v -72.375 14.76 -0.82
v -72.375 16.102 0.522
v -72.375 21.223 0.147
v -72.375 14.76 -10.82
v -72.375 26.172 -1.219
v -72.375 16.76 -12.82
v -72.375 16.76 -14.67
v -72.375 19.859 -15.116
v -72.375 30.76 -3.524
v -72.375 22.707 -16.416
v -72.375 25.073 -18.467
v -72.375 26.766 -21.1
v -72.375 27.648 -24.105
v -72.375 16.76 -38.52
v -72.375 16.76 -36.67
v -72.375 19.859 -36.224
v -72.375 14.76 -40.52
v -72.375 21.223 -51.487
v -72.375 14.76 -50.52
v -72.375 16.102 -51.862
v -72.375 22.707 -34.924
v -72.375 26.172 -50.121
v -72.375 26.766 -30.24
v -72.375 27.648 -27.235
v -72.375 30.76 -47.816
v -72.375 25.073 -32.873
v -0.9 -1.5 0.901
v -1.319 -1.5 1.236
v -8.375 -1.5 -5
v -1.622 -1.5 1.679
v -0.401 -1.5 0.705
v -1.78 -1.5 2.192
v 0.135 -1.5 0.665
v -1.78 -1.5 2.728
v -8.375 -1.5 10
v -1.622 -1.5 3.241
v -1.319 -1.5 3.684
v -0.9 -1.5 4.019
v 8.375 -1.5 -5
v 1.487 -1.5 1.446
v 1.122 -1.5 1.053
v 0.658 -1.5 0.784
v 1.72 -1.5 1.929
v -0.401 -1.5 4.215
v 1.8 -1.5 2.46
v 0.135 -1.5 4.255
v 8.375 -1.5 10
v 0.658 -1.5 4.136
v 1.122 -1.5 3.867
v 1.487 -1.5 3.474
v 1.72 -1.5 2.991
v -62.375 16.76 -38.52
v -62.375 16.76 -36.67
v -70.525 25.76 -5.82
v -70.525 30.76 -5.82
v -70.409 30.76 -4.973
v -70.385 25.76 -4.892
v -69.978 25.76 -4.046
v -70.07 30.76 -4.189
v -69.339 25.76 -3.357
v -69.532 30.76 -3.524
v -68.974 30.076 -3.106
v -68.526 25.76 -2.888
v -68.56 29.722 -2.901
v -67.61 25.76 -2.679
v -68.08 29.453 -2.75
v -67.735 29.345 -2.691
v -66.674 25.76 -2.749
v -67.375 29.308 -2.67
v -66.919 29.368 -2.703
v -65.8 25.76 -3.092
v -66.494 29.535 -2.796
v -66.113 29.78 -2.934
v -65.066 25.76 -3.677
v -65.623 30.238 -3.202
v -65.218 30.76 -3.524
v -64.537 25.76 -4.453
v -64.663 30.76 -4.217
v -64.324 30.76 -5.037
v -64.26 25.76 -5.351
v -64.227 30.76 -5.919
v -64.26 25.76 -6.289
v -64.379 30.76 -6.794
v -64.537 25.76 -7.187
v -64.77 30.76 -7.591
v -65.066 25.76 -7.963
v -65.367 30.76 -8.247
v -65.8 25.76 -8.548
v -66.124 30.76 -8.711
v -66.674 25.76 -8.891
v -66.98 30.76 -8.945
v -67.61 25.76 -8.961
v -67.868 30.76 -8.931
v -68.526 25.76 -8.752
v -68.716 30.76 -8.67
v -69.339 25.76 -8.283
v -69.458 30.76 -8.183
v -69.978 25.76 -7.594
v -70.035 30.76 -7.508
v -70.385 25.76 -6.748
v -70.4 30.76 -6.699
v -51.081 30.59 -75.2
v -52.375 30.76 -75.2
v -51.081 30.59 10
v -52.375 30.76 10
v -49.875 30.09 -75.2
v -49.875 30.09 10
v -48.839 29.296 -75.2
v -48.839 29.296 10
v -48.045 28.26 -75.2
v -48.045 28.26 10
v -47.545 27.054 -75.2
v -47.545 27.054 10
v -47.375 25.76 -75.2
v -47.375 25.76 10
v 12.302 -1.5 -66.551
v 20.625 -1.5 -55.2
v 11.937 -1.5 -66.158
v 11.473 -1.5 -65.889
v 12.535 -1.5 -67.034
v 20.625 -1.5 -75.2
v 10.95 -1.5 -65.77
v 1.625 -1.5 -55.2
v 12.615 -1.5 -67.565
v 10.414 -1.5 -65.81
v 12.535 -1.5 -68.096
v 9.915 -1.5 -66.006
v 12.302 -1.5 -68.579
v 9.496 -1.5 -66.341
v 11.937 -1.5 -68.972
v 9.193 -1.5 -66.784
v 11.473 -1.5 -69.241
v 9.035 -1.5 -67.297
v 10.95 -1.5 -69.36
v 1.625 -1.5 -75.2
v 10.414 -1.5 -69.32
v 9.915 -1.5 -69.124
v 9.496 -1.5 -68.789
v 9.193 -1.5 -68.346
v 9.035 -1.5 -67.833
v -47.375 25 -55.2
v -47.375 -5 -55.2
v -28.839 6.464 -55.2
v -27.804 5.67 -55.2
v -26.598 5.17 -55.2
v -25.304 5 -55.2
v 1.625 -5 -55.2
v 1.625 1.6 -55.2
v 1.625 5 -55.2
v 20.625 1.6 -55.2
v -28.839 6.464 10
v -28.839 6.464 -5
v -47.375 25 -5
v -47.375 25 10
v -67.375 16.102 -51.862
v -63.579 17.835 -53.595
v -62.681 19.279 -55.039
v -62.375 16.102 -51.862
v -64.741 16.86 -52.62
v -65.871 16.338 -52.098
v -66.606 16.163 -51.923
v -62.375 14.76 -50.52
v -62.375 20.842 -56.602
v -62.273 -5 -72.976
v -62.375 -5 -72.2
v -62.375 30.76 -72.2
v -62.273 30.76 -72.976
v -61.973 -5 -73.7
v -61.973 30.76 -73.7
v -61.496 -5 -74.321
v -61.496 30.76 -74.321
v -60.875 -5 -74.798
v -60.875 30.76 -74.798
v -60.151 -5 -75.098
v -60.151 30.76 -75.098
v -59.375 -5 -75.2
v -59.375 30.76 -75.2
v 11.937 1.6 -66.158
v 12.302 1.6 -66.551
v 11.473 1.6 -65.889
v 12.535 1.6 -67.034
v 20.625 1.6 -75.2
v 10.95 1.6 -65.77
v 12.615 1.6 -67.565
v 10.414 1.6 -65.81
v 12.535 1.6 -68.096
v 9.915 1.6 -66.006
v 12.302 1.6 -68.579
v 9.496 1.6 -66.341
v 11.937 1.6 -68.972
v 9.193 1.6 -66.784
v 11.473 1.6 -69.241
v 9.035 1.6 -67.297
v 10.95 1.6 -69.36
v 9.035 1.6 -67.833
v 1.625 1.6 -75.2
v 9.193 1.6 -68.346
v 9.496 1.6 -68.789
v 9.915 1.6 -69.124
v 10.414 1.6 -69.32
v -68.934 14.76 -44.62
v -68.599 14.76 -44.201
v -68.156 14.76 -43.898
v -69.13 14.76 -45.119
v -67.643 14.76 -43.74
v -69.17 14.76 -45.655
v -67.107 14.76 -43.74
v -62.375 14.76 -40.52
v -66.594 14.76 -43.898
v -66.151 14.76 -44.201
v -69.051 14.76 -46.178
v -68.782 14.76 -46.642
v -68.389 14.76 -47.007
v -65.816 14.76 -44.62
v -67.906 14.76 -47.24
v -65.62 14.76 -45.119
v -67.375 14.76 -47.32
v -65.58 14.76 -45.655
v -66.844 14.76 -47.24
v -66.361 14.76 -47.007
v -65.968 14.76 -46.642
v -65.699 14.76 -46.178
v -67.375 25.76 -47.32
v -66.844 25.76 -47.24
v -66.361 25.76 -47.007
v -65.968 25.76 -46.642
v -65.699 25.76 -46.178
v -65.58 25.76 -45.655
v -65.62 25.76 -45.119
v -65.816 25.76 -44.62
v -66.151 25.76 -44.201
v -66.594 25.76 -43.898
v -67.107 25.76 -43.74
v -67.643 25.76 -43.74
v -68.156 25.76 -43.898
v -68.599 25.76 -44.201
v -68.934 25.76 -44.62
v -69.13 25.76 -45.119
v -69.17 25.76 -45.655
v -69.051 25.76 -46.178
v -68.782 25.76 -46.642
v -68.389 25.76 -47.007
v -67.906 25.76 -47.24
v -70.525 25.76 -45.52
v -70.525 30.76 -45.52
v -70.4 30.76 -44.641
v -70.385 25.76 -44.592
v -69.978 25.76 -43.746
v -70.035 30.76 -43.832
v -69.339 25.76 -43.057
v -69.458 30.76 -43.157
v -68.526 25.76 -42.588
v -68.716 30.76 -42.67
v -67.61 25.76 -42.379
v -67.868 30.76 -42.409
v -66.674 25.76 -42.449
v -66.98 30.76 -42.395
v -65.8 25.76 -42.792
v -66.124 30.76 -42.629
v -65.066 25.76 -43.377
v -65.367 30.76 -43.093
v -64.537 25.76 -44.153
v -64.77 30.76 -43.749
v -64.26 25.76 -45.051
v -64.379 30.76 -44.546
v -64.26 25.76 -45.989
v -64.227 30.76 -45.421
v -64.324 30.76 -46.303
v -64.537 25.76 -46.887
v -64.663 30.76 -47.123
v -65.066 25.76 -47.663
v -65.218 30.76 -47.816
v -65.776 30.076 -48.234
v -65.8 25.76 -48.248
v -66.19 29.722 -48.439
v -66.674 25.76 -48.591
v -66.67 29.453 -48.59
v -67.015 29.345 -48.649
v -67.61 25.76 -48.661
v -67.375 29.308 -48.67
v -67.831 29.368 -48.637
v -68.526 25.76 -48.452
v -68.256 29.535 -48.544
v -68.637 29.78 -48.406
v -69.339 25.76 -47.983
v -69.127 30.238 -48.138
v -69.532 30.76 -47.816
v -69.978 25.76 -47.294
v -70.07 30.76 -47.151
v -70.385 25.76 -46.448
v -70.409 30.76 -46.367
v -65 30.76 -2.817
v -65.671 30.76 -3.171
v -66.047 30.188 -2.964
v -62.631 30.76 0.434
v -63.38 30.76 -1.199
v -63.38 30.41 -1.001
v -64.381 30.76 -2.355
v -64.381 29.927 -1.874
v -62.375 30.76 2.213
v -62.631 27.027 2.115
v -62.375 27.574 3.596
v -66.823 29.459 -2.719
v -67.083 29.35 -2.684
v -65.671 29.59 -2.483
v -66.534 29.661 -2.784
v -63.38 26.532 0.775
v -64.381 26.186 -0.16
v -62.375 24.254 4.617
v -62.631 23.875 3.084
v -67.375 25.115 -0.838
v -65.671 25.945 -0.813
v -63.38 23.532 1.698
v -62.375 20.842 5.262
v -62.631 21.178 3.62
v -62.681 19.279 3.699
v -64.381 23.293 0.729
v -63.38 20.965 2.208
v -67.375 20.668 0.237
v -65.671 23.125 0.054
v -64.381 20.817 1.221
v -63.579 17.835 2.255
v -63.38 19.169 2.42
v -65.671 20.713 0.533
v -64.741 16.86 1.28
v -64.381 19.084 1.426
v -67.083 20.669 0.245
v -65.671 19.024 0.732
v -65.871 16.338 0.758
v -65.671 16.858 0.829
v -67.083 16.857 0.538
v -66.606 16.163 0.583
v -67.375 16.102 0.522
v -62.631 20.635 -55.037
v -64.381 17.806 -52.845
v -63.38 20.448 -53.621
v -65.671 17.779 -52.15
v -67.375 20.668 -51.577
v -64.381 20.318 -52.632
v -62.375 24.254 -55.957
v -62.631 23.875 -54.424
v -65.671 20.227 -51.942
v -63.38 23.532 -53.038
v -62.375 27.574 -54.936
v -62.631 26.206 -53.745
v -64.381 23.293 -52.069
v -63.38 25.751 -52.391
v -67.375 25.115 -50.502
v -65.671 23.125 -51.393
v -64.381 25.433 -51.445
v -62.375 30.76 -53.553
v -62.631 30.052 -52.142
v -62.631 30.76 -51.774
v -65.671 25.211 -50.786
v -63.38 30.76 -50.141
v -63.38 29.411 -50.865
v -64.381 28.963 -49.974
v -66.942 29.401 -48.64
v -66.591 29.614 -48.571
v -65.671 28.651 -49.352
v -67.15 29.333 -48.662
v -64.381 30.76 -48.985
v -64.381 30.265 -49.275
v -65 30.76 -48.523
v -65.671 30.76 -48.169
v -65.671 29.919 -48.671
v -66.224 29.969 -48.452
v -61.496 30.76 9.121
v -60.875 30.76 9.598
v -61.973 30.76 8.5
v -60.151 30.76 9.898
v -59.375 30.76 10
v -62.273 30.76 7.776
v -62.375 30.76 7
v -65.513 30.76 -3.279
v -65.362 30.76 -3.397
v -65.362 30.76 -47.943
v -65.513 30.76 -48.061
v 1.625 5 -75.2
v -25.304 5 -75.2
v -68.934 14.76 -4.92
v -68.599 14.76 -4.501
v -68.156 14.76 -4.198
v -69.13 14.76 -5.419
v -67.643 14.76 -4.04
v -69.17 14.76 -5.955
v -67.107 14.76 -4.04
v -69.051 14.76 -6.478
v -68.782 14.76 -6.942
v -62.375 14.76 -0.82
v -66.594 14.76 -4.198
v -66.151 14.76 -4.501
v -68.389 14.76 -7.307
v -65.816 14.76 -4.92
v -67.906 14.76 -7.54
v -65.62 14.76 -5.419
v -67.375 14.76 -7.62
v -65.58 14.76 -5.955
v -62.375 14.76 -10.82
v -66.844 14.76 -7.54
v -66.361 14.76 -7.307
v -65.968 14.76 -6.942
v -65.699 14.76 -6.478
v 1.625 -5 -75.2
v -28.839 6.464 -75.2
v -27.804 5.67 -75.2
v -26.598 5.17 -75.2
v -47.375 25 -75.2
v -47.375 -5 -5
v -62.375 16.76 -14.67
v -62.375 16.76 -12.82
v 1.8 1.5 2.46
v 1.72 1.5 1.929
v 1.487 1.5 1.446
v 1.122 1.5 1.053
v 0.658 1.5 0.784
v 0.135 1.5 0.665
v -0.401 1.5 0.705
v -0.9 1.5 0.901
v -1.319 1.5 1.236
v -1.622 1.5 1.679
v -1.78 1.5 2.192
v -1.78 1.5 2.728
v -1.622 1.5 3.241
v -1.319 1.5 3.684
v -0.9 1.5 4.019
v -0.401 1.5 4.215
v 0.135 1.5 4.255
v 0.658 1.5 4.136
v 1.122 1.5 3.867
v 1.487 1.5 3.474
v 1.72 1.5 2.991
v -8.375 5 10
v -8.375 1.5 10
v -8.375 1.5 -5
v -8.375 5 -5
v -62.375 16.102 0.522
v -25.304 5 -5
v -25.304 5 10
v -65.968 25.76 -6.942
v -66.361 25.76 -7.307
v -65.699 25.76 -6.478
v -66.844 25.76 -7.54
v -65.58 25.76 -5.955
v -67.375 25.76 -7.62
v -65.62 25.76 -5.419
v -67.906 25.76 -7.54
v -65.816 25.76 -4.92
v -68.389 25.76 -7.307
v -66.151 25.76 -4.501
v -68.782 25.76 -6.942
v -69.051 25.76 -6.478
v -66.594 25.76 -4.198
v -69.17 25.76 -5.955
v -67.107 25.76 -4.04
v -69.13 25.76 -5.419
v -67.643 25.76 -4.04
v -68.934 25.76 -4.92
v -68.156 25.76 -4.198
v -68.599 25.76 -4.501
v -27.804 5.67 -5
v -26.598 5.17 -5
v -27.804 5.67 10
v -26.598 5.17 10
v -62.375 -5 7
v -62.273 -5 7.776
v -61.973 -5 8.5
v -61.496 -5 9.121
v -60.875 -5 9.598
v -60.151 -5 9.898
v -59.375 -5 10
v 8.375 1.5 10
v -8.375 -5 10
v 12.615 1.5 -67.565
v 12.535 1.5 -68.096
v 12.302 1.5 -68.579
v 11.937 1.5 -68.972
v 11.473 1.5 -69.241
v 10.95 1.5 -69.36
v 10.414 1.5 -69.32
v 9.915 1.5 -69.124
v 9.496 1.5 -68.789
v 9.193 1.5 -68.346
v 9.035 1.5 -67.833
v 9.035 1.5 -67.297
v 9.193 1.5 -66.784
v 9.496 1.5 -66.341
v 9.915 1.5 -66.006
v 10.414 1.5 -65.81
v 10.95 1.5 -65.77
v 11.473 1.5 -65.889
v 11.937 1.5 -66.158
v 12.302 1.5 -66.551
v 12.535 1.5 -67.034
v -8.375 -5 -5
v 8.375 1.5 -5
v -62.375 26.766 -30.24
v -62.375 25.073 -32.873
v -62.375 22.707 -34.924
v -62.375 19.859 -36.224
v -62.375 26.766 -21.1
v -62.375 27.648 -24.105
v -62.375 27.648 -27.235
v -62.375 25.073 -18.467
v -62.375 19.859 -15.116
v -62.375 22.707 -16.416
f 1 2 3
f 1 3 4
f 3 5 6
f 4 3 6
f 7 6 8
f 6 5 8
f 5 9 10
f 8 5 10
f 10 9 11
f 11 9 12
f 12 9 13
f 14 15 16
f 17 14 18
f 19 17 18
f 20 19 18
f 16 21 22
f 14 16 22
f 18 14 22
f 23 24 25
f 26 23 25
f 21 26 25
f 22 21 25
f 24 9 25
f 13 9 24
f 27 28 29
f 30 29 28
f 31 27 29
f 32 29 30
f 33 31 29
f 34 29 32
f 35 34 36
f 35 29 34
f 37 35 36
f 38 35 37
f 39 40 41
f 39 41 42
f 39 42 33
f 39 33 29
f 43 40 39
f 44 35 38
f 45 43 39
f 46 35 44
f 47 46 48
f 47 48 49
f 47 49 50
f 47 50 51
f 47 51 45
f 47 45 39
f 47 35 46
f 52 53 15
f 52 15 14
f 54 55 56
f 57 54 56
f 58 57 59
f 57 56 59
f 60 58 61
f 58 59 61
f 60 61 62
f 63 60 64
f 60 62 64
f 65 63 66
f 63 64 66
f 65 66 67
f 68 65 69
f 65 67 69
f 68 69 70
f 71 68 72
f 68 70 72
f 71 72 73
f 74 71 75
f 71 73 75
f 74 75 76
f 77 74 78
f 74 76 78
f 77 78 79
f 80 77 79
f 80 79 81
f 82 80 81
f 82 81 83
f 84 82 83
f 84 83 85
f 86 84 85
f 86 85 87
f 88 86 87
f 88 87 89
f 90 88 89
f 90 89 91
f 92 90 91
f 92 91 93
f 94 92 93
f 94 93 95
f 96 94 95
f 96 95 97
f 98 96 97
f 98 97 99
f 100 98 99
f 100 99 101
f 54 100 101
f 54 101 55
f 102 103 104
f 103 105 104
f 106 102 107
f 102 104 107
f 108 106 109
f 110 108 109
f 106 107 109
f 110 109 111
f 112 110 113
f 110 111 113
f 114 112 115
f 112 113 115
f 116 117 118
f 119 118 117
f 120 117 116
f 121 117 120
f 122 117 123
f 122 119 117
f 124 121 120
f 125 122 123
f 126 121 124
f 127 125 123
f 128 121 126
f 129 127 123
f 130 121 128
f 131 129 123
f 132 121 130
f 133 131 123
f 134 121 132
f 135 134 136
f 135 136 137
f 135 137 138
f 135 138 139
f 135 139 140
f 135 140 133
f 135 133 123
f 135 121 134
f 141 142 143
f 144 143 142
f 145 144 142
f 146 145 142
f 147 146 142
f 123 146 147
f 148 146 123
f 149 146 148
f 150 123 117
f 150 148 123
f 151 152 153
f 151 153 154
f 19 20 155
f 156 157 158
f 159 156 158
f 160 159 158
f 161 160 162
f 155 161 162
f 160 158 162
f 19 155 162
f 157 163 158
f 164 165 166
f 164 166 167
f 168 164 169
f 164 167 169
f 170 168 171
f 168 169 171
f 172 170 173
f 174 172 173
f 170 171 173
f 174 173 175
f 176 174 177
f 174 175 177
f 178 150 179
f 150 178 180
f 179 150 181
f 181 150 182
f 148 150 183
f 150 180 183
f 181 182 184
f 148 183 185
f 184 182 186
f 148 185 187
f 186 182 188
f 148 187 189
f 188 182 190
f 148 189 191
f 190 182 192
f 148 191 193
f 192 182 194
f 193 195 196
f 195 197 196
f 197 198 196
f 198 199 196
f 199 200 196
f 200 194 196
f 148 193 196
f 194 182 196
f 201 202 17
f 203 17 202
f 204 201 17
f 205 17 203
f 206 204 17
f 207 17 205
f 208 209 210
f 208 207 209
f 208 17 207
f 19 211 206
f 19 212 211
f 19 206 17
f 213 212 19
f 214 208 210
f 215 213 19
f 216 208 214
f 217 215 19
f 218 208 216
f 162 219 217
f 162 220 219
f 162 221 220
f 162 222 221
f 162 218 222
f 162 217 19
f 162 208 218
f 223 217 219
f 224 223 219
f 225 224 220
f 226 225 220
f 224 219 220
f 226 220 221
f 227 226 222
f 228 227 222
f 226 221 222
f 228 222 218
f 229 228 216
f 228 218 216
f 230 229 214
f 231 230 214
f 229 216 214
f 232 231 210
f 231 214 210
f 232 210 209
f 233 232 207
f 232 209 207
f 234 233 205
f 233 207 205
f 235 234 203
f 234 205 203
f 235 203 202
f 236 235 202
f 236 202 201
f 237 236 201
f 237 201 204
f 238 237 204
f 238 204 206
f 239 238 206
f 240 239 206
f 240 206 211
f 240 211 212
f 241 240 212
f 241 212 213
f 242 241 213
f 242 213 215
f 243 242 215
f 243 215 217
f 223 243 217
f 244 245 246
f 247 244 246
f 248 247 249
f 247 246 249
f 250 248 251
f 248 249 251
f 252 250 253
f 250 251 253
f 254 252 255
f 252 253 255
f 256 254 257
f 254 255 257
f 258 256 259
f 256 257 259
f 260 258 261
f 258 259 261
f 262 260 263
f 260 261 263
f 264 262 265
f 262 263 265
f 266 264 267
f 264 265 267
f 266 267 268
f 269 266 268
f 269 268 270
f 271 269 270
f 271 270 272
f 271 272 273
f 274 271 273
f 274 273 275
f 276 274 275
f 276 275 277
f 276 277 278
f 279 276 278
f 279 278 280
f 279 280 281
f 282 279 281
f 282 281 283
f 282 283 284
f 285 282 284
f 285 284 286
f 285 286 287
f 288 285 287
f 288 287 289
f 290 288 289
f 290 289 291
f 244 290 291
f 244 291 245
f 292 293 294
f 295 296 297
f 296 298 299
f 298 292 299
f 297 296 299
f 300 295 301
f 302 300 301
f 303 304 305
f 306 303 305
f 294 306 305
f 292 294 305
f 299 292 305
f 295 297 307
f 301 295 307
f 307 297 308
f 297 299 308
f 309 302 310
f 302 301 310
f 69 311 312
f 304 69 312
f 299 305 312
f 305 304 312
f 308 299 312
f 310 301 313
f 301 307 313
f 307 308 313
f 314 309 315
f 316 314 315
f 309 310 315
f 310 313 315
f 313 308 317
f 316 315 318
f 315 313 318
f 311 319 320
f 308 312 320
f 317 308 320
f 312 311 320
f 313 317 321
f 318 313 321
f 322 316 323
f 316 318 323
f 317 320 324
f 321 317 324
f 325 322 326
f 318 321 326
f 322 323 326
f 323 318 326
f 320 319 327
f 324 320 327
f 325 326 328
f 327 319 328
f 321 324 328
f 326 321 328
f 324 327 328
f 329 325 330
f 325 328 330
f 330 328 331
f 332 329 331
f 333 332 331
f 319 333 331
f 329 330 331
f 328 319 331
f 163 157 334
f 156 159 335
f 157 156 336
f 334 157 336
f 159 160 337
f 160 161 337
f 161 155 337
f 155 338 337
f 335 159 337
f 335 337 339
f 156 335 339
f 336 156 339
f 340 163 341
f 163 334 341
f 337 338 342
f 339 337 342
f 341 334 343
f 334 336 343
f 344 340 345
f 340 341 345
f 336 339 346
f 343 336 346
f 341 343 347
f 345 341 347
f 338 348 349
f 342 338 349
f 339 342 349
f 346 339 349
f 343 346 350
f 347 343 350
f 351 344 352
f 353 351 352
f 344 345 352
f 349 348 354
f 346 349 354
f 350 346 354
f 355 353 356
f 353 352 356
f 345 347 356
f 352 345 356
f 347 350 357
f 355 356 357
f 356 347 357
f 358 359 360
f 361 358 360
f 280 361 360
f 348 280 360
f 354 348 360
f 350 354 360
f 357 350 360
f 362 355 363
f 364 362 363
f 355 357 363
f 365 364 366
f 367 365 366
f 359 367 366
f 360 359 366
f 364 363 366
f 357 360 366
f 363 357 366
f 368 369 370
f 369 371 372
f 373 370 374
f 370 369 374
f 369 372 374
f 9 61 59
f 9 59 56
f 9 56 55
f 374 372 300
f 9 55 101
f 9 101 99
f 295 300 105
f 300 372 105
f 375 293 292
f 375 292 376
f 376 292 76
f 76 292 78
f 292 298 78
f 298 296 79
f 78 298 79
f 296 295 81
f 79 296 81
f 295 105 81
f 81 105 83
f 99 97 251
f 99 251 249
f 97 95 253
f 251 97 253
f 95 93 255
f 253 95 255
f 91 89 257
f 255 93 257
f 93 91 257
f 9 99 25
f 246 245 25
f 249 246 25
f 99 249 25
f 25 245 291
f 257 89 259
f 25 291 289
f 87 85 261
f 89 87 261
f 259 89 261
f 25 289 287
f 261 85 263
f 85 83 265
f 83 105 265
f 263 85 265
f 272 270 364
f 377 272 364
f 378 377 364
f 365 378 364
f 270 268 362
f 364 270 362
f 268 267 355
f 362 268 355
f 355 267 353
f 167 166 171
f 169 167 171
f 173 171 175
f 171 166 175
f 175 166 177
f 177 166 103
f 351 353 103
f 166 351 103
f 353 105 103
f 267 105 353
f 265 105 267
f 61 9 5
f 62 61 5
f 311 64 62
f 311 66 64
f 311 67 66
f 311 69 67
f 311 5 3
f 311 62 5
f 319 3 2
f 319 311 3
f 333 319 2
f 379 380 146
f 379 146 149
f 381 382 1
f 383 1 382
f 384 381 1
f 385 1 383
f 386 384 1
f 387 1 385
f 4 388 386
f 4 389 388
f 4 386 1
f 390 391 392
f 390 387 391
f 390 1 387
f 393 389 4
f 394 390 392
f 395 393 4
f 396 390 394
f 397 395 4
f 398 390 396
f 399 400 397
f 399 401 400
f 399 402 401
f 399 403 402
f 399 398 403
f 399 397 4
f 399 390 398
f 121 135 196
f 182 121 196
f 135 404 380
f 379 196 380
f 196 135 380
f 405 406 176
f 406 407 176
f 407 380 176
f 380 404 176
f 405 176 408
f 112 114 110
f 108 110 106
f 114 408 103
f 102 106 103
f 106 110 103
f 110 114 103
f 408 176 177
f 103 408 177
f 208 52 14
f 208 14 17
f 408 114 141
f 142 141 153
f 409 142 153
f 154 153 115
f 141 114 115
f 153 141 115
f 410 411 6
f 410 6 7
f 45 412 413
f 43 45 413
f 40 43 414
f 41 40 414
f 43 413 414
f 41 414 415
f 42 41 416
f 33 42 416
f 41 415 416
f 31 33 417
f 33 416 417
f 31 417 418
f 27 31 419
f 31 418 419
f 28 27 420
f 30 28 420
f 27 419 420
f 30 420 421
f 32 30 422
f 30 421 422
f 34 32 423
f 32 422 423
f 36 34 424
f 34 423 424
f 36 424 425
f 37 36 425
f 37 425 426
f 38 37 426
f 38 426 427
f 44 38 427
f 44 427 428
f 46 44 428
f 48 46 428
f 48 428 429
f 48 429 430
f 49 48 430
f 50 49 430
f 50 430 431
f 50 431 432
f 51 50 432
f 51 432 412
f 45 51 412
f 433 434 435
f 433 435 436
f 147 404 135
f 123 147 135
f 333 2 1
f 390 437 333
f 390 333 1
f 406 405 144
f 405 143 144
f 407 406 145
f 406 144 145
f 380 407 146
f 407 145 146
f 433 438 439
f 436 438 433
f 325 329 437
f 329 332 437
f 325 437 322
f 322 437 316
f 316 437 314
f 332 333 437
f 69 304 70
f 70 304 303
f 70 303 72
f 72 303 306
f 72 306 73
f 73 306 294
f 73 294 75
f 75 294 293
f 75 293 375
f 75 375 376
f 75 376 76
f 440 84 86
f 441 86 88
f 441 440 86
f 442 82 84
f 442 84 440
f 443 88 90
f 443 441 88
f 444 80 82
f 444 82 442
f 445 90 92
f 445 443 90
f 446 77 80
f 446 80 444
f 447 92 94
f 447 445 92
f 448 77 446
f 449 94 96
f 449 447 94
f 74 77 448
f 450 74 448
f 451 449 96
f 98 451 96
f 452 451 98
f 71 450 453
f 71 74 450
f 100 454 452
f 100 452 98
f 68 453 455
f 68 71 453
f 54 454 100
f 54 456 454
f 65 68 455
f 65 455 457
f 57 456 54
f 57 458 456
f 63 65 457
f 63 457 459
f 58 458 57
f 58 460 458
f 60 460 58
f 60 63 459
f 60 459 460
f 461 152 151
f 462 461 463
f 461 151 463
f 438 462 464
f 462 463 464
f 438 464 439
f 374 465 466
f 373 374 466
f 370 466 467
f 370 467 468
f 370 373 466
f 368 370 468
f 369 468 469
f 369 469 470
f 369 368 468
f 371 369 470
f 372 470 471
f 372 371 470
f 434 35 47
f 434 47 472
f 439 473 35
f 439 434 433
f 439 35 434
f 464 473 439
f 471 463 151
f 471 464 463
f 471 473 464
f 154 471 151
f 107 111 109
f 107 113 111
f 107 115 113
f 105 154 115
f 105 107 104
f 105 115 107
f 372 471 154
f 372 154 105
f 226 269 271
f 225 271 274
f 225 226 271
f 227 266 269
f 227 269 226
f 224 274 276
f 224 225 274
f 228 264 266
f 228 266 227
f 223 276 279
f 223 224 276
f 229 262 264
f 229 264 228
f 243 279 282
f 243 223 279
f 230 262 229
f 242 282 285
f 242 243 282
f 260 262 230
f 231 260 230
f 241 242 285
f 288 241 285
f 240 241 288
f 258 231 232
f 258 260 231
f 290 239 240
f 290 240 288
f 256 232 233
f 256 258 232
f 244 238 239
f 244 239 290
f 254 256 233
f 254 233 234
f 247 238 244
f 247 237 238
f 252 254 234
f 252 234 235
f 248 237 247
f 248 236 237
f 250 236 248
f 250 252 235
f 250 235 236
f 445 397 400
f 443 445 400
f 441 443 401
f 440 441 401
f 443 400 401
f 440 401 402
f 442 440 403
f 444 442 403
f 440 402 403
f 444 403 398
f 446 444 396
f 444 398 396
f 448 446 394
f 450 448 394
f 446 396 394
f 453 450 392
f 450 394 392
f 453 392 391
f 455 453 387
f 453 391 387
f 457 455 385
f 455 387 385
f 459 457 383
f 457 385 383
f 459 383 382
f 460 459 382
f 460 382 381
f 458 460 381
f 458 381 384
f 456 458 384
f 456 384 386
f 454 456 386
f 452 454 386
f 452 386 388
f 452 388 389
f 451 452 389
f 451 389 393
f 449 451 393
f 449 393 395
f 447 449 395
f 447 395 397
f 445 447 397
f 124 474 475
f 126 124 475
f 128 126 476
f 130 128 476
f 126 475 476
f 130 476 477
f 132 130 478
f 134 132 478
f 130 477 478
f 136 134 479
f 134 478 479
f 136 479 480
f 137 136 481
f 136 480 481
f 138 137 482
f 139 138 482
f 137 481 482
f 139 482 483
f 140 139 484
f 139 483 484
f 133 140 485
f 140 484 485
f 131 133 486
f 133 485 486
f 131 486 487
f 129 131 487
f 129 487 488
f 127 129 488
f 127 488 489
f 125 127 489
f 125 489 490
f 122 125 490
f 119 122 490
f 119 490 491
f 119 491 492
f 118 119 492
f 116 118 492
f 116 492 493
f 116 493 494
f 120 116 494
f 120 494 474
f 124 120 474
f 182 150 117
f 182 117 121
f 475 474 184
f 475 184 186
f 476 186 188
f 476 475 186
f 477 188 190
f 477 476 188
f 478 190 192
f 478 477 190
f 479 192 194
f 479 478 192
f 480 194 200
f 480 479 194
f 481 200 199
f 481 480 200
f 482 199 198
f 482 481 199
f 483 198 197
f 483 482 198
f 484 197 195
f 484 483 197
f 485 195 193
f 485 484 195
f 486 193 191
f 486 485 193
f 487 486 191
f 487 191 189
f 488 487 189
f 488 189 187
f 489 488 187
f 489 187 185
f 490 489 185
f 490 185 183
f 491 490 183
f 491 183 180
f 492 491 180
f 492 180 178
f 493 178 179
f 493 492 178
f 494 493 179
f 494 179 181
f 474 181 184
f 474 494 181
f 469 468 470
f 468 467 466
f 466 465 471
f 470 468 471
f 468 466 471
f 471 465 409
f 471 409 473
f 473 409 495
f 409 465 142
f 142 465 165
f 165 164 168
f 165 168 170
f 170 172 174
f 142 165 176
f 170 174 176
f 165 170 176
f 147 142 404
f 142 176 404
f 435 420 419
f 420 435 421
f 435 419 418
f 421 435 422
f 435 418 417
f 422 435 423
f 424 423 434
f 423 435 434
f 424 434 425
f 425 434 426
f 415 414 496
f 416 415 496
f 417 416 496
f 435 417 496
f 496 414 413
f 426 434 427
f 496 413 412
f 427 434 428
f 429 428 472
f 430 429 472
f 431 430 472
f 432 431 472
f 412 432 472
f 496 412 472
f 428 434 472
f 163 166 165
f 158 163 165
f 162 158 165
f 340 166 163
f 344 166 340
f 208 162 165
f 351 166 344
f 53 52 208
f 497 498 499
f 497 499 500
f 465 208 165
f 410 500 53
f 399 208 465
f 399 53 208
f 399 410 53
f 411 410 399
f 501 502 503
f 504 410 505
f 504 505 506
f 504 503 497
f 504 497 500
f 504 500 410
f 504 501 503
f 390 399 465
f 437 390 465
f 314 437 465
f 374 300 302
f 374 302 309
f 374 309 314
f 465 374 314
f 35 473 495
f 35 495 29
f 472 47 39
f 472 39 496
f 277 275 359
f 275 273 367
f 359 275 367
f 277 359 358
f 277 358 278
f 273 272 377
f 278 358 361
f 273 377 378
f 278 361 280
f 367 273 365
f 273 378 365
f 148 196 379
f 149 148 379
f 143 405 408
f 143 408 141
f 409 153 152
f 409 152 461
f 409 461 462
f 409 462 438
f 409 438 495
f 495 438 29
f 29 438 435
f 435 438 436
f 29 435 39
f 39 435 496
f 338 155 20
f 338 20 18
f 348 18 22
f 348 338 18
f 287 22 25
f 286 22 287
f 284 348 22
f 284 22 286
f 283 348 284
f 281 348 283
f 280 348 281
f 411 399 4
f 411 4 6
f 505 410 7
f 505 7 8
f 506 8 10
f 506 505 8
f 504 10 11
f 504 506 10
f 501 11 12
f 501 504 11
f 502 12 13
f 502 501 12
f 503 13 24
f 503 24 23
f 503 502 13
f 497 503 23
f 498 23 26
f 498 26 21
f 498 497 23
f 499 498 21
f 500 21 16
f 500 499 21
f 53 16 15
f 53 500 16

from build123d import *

# Parameters (mm, degrees)
ESBO_O1_W                         = 16.75
ESBO_O1_H                         = 3
RESSALTO_EXTRUS_O1_DEPTH          = 10
ESBO_O2_W                         = 39
ESBO_O2_H                         = 10
RESSALTO_EXTRUS_O2_DEPTH          = 20
ESBO_O3_W                         = 68
ESBO_O3_H                         = 20
RESSALTO_EXTRUS_O3_DEPTH          = 10
CORTE_EXTRUS_O1_REACH             = 107.71
ESBO_O4_W                         = 19
ESBO_O4_H                         = 3.5
ESBO_O4_H_2                       = 3.4
ESBO_O5_W                         = 85.2
ESBO_O5_H                         = 25.76
RESSALTO_EXTRUS_O4_DEPTH          = 15
RESSALTO_EXTRUS_O5_DEPTH          = 10
CORTE_EXTRUS_O2_REACH             = 108.224
ESBO_O7_R                         = 1.8
ESBO_O8_R                         = 3.15
CORTE_EXTRUS_O3_DEPTH             = 5
CHANFRO1_SIZE                     = 20
FILETE1_R                         = 5
FILETE4_R                         = 3
FILETE5_R                         = 5
FILETE6_R                         = 5
CORTE_EXTRUS_O4_REACH             = 110.394
ESBO_O9_R                         = 1.8
CORTE_EXTRUS_O4_DIRECTION_2_DEPTH = 5
ESBO_O10_W                        = 55.75
ESBO_O10_H                        = 5
CORTE_EXTRUS_O5_DEPTH             = 111.326598128


with BuildPart() as part:
    # Esboço1 → Ressalto-extrusão1 (new, symmetric)
    with BuildSketch(Plane.XY):
        Rectangle(ESBO_O1_W, ESBO_O1_H)
    extrude(amount=RESSALTO_EXTRUS_O1_DEPTH, both=True)

    # Esboço2 → Ressalto-extrusão2 (add, through all)
    with BuildSketch(Plane.XY.offset(10)):
        with Locations((-27.875, 0)):
            Rectangle(ESBO_O2_W, ESBO_O2_H)
    extrude(amount=-RESSALTO_EXTRUS_O2_DEPTH)

    # Esboço3 → Ressalto-extrusão3 (add, through all)
    with BuildSketch(Plane(origin=(0, 5, 0), x_dir=(1, 0, 0), z_dir=(0, 1, 0))):
        Polygon((-62.375, -10), (-47.375, -10), (-47.375, 10), (-47.375, 55.2), (-47.375, 75.2), (-62.375, 75.2), align=None)
        with Locations((-13.375, 65.2)):
            Rectangle(ESBO_O3_W, ESBO_O3_H)
    extrude(amount=-RESSALTO_EXTRUS_O3_DEPTH)

    # Esboço4 → Corte-extrusão1 (cut, up to next)
    with BuildSketch(Plane(origin=(0, 0, -75.2), x_dir=(-1, 0, 0), z_dir=(0, 0, -1)), mode=Mode.PRIVATE) as corte_extrus_o1_sk1:
        with Locations((-11.125, -3.25)):
            Rectangle(ESBO_O4_W, ESBO_O4_H)
    corte_extrus_o1_tool1 = extrude(corte_extrus_o1_sk1.sketch, amount=-CORTE_EXTRUS_O1_REACH, mode=Mode.PRIVATE) & part.part
    # Esboço4 → Corte-extrusão1 (cut, up to next)
    with BuildSketch(Plane(origin=(0, 0, -75.2), x_dir=(-1, 0, 0), z_dir=(0, 0, -1)), mode=Mode.PRIVATE) as corte_extrus_o1_sk2:
        with Locations((-11.125, 3.3)):
            Rectangle(ESBO_O4_W, ESBO_O4_H_2)
    corte_extrus_o1_tool2 = extrude(corte_extrus_o1_sk2.sketch, amount=-CORTE_EXTRUS_O1_REACH, mode=Mode.PRIVATE) & part.part
    add(corte_extrus_o1_tool1.solids().sort_by_distance((11.125, -3.25, -75.2))[0], mode=Mode.SUBTRACT)
    add(corte_extrus_o1_tool2.solids().sort_by_distance((11.125, 3.3, -75.2))[0], mode=Mode.SUBTRACT)

    # Esboço5 → Ressalto-extrusão4 (add)
    with BuildSketch(Plane.ZY.offset(62.375)):
        with Locations((-32.6, 17.88)):
            Rectangle(ESBO_O5_W, ESBO_O5_H)
    extrude(amount=-RESSALTO_EXTRUS_O4_DEPTH)

    # Esboço6 → Ressalto-extrusão5 (add)
    with BuildSketch(Plane.ZY.offset(62.375)):
        with BuildLine():
            Line((-36.669998569, 16.76), (-38.519998569, 16.76))
            Line((-38.519998569, 16.76), (-40.519998569, 14.76))
            Line((-40.519998569, 14.76), (-50.519998569, 14.76))
            Line((-50.519998569, 14.76), (-51.86172779, 16.101729221))
            ThreePointArc((-51.86172779, 16.101729221), (-50.925638362, 23.730843469), (-47.815878547, 30.76))
            Line((-47.815878547, 30.76), (-3.524118591, 30.76))
            ThreePointArc((-3.524118591, 30.76), (-0.414358777, 23.730843469), (0.521730651, 16.101729221))
            Line((0.521730651, 16.101729221), (-0.819998569, 14.76))
            Line((-0.819998569, 14.76), (-10.819998569, 14.76))
            Line((-10.819998569, 14.76), (-12.819998569, 16.76))
            Line((-12.819998569, 16.76), (-14.669998569, 16.76))
            ThreePointArc((-14.669998569, 16.76), (-25.669998569, 27.76), (-36.669998569, 16.76))
        make_face()
    extrude(amount=RESSALTO_EXTRUS_O5_DEPTH)

    # Esboço7 → Corte-extrusão2 (cut, up to next)
    with BuildSketch(Plane.XZ.offset(-14.76), mode=Mode.PRIVATE) as corte_extrus_o2_sk1:
        with Locations(Location((-67.375, -5.819998569, 0), (0, 0, 270))):
            Circle(ESBO_O7_R)
    corte_extrus_o2_tool1 = extrude(corte_extrus_o2_sk1.sketch, amount=-CORTE_EXTRUS_O2_REACH, mode=Mode.PRIVATE) & part.part
    # Esboço7 → Corte-extrusão2 (cut, up to next)
    with BuildSketch(Plane.XZ.offset(-14.76), mode=Mode.PRIVATE) as corte_extrus_o2_sk2:
        with Locations(Location((-67.375, -45.519998569, 0), (0, 0, 270))):
            Circle(ESBO_O7_R)
    corte_extrus_o2_tool2 = extrude(corte_extrus_o2_sk2.sketch, amount=-CORTE_EXTRUS_O2_REACH, mode=Mode.PRIVATE) & part.part
    add(corte_extrus_o2_tool1.solids().sort_by_distance((-67.375, 14.76, -5.819999))[0], mode=Mode.SUBTRACT)
    add(corte_extrus_o2_tool2.solids().sort_by_distance((-67.375, 14.76, -45.519999))[0], mode=Mode.SUBTRACT)

    # Esboço8 → Corte-extrusão3 (cut)
    with BuildSketch(Plane(origin=(0, 30.76, 0), x_dir=(1, 0, 0), z_dir=(0, 1, 0))):
        with Locations(Location((-67.375, 45.519998569, 0), (0, 0, 180))):
            Circle(ESBO_O8_R)
        with Locations(Location((-67.375, 5.819998569, 0), (0, 0, 180))):
            Circle(ESBO_O8_R)
    extrude(amount=-CORTE_EXTRUS_O3_DEPTH, mode=Mode.SUBTRACT)

    # Chanfro1
    chanfro1_edges = [part.edges().sort_by_distance(p)[0] for p in [
        (-47.375, 5, -65.2),
        (-47.375, 5, 0),
    ]]
    chamfer(chanfro1_edges, length=CHANFRO1_SIZE)

    # Filete1
    # the kernel refuses this fillet: 5 mm, written as the material it adds along each edge
    with BuildSketch(Plane(origin=(-62.375, 16.76, -25.669998569), x_dir=(0, -0.4814020816411878, -0.8764998778046299), z_dir=(0, -0.8764998778046299, 0.4814020816411878))) as filete1_piece_1_section:
        with BuildLine():
            CenterArc((26.2 + FILETE1_R, -FILETE1_R), FILETE1_R, 90, 90)
            Line((26.2, -FILETE1_R), (26.2, 0))
            Line((26.2, 0), (26.2 + FILETE1_R, 0))
        make_face()
    filete1_piece_1 = revolve(axis=Axis((-62.375, 16.76, -25.669998569), (1, 0, 0)), revolution_arc=88.414248189, mode=Mode.PRIVATE)
    filete1_piece_1 = split(filete1_piece_1, bisect_by=Plane(origin=(-63.543022515, 30.76, -51.592589171), z_dir=(0, -1, 0)), keep=Keep.TOP, mode=Mode.PRIVATE)
    filete1_piece_1 = split(filete1_piece_1, bisect_by=Plane(origin=(-63.543022515, 19.962032762, -55.722031332), z_dir=(0, 0.7071067811865495, 0.7071067811865457)), keep=Keep.TOP, mode=Mode.PRIVATE)
    filete1_piece_1 = filete1_piece_1 - Plane(origin=(-67.375, 24.091474922, -45.519998569), x_dir=(-1, 0, 0), z_dir=(0, 1, 0)) * Cylinder(3.15, 125, mode=Mode.PRIVATE)
    add(filete1_piece_1)
    with BuildSketch(Plane(origin=(-62.375, 16.76, -25.669998569), x_dir=(0, 0.8628423353119256, 0.5054731490331239), z_dir=(0, 0.5054731490331239, -0.8628423353119256))) as filete1_piece_2_section:
        with BuildLine():
            CenterArc((26.2 + FILETE1_R, -FILETE1_R), FILETE1_R, 90, 90)
            Line((26.2, -FILETE1_R), (26.2, 0))
            Line((26.2, 0), (26.2 + FILETE1_R, 0))
        make_face()
    filete1_piece_2 = revolve(axis=Axis((-62.375, 16.76, -25.669998569), (1, 0, 0)), revolution_arc=88.414248189, mode=Mode.PRIVATE)
    filete1_piece_2 = split(filete1_piece_2, bisect_by=Plane(origin=(-63.543022328, 19.962032891, 4.382034321), z_dir=(0, 0.7071067811865496, -0.7071067811865455)), keep=Keep.TOP, mode=Mode.PRIVATE)
    filete1_piece_2 = split(filete1_piece_2, bisect_by=Plane(origin=(-63.543022328, 30.76, 0.252591971), z_dir=(0, -1, 0)), keep=Keep.TOP, mode=Mode.PRIVATE)
    filete1_piece_2 = filete1_piece_2 - Plane(origin=(-67.375, 24.091475241, -5.819998569), x_dir=(-1, 0, 0), z_dir=(0, 1, 0)) * Cylinder(3.15, 125, mode=Mode.PRIVATE)
    add(filete1_piece_2)

    # Filete4
    filete4_edges = [part.edges().sort_by_distance(p)[0] for p in [
        (-62.375, 12.88, 10),
        (-62.375, 12.88, -75.2),
    ]]
    fillet(filete4_edges, radius=FILETE4_R)

    # Filete5
    filete5_edges = [part.edges().sort_by_distance(p)[0] for p in [
        (-47.375, 30.76, -32.6),
    ]]
    fillet(filete5_edges, radius=FILETE5_R)

    # Filete6
    filete6_edges = [part.edges().sort_by_distance(p)[0] for p in [
        (-27.375, 5, -65.2),
        (-27.375, 5, 0),
    ]]
    fillet(filete6_edges, radius=FILETE6_R)

    # Esboço9 → Corte-extrusão4 (cut, up to next)
    with BuildSketch(Plane(origin=(0, 1.5, 0), x_dir=(1, 0, 0), z_dir=(0, 1, 0)), mode=Mode.PRIVATE) as corte_extrus_o4_sk1:
        with Locations((0, -2.46)):
            Circle(ESBO_O9_R)
    corte_extrus_o4_tool1 = extrude(corte_extrus_o4_sk1.sketch, amount=-CORTE_EXTRUS_O4_REACH, mode=Mode.PRIVATE) & part.part
    # Esboço9 → Corte-extrusão4 (cut, up to next)
    with BuildSketch(Plane(origin=(0, 1.5, 0), x_dir=(1, 0, 0), z_dir=(0, 1, 0)), mode=Mode.PRIVATE) as corte_extrus_o4_sk2:
        with Locations((10.815, 67.565)):
            Circle(ESBO_O9_R)
    corte_extrus_o4_tool2 = extrude(corte_extrus_o4_sk2.sketch, amount=-CORTE_EXTRUS_O4_REACH, mode=Mode.PRIVATE) & part.part
    add(corte_extrus_o4_tool1.solids().sort_by_distance((0, 1.5, 2.46))[0], mode=Mode.SUBTRACT)
    add(corte_extrus_o4_tool2.solids().sort_by_distance((10.815, 1.5, -67.565))[0], mode=Mode.SUBTRACT)

    # Esboço9 → Corte-extrusão4 direction 2 (cut)
    with BuildSketch(Plane(origin=(0, 1.5, 0), x_dir=(1, 0, 0), z_dir=(0, 1, 0))):
        with Locations((0, -2.46)):
            Circle(ESBO_O9_R)
        with Locations((10.815, 67.565)):
            Circle(ESBO_O9_R)
    extrude(amount=CORTE_EXTRUS_O4_DIRECTION_2_DEPTH, mode=Mode.SUBTRACT)

    # Esboço10 → Corte-extrusão5 (cut, through all)
    with BuildSketch(Plane(origin=(0, 30.76, 0), x_dir=(1, 0, 0), z_dir=(0, 1, 0))):
        with Locations((-19.5, 7.5)):
            Rectangle(ESBO_O10_W, ESBO_O10_H)
    extrude(amount=-CORTE_EXTRUS_O5_DEPTH, mode=Mode.SUBTRACT)


solid = part.part
